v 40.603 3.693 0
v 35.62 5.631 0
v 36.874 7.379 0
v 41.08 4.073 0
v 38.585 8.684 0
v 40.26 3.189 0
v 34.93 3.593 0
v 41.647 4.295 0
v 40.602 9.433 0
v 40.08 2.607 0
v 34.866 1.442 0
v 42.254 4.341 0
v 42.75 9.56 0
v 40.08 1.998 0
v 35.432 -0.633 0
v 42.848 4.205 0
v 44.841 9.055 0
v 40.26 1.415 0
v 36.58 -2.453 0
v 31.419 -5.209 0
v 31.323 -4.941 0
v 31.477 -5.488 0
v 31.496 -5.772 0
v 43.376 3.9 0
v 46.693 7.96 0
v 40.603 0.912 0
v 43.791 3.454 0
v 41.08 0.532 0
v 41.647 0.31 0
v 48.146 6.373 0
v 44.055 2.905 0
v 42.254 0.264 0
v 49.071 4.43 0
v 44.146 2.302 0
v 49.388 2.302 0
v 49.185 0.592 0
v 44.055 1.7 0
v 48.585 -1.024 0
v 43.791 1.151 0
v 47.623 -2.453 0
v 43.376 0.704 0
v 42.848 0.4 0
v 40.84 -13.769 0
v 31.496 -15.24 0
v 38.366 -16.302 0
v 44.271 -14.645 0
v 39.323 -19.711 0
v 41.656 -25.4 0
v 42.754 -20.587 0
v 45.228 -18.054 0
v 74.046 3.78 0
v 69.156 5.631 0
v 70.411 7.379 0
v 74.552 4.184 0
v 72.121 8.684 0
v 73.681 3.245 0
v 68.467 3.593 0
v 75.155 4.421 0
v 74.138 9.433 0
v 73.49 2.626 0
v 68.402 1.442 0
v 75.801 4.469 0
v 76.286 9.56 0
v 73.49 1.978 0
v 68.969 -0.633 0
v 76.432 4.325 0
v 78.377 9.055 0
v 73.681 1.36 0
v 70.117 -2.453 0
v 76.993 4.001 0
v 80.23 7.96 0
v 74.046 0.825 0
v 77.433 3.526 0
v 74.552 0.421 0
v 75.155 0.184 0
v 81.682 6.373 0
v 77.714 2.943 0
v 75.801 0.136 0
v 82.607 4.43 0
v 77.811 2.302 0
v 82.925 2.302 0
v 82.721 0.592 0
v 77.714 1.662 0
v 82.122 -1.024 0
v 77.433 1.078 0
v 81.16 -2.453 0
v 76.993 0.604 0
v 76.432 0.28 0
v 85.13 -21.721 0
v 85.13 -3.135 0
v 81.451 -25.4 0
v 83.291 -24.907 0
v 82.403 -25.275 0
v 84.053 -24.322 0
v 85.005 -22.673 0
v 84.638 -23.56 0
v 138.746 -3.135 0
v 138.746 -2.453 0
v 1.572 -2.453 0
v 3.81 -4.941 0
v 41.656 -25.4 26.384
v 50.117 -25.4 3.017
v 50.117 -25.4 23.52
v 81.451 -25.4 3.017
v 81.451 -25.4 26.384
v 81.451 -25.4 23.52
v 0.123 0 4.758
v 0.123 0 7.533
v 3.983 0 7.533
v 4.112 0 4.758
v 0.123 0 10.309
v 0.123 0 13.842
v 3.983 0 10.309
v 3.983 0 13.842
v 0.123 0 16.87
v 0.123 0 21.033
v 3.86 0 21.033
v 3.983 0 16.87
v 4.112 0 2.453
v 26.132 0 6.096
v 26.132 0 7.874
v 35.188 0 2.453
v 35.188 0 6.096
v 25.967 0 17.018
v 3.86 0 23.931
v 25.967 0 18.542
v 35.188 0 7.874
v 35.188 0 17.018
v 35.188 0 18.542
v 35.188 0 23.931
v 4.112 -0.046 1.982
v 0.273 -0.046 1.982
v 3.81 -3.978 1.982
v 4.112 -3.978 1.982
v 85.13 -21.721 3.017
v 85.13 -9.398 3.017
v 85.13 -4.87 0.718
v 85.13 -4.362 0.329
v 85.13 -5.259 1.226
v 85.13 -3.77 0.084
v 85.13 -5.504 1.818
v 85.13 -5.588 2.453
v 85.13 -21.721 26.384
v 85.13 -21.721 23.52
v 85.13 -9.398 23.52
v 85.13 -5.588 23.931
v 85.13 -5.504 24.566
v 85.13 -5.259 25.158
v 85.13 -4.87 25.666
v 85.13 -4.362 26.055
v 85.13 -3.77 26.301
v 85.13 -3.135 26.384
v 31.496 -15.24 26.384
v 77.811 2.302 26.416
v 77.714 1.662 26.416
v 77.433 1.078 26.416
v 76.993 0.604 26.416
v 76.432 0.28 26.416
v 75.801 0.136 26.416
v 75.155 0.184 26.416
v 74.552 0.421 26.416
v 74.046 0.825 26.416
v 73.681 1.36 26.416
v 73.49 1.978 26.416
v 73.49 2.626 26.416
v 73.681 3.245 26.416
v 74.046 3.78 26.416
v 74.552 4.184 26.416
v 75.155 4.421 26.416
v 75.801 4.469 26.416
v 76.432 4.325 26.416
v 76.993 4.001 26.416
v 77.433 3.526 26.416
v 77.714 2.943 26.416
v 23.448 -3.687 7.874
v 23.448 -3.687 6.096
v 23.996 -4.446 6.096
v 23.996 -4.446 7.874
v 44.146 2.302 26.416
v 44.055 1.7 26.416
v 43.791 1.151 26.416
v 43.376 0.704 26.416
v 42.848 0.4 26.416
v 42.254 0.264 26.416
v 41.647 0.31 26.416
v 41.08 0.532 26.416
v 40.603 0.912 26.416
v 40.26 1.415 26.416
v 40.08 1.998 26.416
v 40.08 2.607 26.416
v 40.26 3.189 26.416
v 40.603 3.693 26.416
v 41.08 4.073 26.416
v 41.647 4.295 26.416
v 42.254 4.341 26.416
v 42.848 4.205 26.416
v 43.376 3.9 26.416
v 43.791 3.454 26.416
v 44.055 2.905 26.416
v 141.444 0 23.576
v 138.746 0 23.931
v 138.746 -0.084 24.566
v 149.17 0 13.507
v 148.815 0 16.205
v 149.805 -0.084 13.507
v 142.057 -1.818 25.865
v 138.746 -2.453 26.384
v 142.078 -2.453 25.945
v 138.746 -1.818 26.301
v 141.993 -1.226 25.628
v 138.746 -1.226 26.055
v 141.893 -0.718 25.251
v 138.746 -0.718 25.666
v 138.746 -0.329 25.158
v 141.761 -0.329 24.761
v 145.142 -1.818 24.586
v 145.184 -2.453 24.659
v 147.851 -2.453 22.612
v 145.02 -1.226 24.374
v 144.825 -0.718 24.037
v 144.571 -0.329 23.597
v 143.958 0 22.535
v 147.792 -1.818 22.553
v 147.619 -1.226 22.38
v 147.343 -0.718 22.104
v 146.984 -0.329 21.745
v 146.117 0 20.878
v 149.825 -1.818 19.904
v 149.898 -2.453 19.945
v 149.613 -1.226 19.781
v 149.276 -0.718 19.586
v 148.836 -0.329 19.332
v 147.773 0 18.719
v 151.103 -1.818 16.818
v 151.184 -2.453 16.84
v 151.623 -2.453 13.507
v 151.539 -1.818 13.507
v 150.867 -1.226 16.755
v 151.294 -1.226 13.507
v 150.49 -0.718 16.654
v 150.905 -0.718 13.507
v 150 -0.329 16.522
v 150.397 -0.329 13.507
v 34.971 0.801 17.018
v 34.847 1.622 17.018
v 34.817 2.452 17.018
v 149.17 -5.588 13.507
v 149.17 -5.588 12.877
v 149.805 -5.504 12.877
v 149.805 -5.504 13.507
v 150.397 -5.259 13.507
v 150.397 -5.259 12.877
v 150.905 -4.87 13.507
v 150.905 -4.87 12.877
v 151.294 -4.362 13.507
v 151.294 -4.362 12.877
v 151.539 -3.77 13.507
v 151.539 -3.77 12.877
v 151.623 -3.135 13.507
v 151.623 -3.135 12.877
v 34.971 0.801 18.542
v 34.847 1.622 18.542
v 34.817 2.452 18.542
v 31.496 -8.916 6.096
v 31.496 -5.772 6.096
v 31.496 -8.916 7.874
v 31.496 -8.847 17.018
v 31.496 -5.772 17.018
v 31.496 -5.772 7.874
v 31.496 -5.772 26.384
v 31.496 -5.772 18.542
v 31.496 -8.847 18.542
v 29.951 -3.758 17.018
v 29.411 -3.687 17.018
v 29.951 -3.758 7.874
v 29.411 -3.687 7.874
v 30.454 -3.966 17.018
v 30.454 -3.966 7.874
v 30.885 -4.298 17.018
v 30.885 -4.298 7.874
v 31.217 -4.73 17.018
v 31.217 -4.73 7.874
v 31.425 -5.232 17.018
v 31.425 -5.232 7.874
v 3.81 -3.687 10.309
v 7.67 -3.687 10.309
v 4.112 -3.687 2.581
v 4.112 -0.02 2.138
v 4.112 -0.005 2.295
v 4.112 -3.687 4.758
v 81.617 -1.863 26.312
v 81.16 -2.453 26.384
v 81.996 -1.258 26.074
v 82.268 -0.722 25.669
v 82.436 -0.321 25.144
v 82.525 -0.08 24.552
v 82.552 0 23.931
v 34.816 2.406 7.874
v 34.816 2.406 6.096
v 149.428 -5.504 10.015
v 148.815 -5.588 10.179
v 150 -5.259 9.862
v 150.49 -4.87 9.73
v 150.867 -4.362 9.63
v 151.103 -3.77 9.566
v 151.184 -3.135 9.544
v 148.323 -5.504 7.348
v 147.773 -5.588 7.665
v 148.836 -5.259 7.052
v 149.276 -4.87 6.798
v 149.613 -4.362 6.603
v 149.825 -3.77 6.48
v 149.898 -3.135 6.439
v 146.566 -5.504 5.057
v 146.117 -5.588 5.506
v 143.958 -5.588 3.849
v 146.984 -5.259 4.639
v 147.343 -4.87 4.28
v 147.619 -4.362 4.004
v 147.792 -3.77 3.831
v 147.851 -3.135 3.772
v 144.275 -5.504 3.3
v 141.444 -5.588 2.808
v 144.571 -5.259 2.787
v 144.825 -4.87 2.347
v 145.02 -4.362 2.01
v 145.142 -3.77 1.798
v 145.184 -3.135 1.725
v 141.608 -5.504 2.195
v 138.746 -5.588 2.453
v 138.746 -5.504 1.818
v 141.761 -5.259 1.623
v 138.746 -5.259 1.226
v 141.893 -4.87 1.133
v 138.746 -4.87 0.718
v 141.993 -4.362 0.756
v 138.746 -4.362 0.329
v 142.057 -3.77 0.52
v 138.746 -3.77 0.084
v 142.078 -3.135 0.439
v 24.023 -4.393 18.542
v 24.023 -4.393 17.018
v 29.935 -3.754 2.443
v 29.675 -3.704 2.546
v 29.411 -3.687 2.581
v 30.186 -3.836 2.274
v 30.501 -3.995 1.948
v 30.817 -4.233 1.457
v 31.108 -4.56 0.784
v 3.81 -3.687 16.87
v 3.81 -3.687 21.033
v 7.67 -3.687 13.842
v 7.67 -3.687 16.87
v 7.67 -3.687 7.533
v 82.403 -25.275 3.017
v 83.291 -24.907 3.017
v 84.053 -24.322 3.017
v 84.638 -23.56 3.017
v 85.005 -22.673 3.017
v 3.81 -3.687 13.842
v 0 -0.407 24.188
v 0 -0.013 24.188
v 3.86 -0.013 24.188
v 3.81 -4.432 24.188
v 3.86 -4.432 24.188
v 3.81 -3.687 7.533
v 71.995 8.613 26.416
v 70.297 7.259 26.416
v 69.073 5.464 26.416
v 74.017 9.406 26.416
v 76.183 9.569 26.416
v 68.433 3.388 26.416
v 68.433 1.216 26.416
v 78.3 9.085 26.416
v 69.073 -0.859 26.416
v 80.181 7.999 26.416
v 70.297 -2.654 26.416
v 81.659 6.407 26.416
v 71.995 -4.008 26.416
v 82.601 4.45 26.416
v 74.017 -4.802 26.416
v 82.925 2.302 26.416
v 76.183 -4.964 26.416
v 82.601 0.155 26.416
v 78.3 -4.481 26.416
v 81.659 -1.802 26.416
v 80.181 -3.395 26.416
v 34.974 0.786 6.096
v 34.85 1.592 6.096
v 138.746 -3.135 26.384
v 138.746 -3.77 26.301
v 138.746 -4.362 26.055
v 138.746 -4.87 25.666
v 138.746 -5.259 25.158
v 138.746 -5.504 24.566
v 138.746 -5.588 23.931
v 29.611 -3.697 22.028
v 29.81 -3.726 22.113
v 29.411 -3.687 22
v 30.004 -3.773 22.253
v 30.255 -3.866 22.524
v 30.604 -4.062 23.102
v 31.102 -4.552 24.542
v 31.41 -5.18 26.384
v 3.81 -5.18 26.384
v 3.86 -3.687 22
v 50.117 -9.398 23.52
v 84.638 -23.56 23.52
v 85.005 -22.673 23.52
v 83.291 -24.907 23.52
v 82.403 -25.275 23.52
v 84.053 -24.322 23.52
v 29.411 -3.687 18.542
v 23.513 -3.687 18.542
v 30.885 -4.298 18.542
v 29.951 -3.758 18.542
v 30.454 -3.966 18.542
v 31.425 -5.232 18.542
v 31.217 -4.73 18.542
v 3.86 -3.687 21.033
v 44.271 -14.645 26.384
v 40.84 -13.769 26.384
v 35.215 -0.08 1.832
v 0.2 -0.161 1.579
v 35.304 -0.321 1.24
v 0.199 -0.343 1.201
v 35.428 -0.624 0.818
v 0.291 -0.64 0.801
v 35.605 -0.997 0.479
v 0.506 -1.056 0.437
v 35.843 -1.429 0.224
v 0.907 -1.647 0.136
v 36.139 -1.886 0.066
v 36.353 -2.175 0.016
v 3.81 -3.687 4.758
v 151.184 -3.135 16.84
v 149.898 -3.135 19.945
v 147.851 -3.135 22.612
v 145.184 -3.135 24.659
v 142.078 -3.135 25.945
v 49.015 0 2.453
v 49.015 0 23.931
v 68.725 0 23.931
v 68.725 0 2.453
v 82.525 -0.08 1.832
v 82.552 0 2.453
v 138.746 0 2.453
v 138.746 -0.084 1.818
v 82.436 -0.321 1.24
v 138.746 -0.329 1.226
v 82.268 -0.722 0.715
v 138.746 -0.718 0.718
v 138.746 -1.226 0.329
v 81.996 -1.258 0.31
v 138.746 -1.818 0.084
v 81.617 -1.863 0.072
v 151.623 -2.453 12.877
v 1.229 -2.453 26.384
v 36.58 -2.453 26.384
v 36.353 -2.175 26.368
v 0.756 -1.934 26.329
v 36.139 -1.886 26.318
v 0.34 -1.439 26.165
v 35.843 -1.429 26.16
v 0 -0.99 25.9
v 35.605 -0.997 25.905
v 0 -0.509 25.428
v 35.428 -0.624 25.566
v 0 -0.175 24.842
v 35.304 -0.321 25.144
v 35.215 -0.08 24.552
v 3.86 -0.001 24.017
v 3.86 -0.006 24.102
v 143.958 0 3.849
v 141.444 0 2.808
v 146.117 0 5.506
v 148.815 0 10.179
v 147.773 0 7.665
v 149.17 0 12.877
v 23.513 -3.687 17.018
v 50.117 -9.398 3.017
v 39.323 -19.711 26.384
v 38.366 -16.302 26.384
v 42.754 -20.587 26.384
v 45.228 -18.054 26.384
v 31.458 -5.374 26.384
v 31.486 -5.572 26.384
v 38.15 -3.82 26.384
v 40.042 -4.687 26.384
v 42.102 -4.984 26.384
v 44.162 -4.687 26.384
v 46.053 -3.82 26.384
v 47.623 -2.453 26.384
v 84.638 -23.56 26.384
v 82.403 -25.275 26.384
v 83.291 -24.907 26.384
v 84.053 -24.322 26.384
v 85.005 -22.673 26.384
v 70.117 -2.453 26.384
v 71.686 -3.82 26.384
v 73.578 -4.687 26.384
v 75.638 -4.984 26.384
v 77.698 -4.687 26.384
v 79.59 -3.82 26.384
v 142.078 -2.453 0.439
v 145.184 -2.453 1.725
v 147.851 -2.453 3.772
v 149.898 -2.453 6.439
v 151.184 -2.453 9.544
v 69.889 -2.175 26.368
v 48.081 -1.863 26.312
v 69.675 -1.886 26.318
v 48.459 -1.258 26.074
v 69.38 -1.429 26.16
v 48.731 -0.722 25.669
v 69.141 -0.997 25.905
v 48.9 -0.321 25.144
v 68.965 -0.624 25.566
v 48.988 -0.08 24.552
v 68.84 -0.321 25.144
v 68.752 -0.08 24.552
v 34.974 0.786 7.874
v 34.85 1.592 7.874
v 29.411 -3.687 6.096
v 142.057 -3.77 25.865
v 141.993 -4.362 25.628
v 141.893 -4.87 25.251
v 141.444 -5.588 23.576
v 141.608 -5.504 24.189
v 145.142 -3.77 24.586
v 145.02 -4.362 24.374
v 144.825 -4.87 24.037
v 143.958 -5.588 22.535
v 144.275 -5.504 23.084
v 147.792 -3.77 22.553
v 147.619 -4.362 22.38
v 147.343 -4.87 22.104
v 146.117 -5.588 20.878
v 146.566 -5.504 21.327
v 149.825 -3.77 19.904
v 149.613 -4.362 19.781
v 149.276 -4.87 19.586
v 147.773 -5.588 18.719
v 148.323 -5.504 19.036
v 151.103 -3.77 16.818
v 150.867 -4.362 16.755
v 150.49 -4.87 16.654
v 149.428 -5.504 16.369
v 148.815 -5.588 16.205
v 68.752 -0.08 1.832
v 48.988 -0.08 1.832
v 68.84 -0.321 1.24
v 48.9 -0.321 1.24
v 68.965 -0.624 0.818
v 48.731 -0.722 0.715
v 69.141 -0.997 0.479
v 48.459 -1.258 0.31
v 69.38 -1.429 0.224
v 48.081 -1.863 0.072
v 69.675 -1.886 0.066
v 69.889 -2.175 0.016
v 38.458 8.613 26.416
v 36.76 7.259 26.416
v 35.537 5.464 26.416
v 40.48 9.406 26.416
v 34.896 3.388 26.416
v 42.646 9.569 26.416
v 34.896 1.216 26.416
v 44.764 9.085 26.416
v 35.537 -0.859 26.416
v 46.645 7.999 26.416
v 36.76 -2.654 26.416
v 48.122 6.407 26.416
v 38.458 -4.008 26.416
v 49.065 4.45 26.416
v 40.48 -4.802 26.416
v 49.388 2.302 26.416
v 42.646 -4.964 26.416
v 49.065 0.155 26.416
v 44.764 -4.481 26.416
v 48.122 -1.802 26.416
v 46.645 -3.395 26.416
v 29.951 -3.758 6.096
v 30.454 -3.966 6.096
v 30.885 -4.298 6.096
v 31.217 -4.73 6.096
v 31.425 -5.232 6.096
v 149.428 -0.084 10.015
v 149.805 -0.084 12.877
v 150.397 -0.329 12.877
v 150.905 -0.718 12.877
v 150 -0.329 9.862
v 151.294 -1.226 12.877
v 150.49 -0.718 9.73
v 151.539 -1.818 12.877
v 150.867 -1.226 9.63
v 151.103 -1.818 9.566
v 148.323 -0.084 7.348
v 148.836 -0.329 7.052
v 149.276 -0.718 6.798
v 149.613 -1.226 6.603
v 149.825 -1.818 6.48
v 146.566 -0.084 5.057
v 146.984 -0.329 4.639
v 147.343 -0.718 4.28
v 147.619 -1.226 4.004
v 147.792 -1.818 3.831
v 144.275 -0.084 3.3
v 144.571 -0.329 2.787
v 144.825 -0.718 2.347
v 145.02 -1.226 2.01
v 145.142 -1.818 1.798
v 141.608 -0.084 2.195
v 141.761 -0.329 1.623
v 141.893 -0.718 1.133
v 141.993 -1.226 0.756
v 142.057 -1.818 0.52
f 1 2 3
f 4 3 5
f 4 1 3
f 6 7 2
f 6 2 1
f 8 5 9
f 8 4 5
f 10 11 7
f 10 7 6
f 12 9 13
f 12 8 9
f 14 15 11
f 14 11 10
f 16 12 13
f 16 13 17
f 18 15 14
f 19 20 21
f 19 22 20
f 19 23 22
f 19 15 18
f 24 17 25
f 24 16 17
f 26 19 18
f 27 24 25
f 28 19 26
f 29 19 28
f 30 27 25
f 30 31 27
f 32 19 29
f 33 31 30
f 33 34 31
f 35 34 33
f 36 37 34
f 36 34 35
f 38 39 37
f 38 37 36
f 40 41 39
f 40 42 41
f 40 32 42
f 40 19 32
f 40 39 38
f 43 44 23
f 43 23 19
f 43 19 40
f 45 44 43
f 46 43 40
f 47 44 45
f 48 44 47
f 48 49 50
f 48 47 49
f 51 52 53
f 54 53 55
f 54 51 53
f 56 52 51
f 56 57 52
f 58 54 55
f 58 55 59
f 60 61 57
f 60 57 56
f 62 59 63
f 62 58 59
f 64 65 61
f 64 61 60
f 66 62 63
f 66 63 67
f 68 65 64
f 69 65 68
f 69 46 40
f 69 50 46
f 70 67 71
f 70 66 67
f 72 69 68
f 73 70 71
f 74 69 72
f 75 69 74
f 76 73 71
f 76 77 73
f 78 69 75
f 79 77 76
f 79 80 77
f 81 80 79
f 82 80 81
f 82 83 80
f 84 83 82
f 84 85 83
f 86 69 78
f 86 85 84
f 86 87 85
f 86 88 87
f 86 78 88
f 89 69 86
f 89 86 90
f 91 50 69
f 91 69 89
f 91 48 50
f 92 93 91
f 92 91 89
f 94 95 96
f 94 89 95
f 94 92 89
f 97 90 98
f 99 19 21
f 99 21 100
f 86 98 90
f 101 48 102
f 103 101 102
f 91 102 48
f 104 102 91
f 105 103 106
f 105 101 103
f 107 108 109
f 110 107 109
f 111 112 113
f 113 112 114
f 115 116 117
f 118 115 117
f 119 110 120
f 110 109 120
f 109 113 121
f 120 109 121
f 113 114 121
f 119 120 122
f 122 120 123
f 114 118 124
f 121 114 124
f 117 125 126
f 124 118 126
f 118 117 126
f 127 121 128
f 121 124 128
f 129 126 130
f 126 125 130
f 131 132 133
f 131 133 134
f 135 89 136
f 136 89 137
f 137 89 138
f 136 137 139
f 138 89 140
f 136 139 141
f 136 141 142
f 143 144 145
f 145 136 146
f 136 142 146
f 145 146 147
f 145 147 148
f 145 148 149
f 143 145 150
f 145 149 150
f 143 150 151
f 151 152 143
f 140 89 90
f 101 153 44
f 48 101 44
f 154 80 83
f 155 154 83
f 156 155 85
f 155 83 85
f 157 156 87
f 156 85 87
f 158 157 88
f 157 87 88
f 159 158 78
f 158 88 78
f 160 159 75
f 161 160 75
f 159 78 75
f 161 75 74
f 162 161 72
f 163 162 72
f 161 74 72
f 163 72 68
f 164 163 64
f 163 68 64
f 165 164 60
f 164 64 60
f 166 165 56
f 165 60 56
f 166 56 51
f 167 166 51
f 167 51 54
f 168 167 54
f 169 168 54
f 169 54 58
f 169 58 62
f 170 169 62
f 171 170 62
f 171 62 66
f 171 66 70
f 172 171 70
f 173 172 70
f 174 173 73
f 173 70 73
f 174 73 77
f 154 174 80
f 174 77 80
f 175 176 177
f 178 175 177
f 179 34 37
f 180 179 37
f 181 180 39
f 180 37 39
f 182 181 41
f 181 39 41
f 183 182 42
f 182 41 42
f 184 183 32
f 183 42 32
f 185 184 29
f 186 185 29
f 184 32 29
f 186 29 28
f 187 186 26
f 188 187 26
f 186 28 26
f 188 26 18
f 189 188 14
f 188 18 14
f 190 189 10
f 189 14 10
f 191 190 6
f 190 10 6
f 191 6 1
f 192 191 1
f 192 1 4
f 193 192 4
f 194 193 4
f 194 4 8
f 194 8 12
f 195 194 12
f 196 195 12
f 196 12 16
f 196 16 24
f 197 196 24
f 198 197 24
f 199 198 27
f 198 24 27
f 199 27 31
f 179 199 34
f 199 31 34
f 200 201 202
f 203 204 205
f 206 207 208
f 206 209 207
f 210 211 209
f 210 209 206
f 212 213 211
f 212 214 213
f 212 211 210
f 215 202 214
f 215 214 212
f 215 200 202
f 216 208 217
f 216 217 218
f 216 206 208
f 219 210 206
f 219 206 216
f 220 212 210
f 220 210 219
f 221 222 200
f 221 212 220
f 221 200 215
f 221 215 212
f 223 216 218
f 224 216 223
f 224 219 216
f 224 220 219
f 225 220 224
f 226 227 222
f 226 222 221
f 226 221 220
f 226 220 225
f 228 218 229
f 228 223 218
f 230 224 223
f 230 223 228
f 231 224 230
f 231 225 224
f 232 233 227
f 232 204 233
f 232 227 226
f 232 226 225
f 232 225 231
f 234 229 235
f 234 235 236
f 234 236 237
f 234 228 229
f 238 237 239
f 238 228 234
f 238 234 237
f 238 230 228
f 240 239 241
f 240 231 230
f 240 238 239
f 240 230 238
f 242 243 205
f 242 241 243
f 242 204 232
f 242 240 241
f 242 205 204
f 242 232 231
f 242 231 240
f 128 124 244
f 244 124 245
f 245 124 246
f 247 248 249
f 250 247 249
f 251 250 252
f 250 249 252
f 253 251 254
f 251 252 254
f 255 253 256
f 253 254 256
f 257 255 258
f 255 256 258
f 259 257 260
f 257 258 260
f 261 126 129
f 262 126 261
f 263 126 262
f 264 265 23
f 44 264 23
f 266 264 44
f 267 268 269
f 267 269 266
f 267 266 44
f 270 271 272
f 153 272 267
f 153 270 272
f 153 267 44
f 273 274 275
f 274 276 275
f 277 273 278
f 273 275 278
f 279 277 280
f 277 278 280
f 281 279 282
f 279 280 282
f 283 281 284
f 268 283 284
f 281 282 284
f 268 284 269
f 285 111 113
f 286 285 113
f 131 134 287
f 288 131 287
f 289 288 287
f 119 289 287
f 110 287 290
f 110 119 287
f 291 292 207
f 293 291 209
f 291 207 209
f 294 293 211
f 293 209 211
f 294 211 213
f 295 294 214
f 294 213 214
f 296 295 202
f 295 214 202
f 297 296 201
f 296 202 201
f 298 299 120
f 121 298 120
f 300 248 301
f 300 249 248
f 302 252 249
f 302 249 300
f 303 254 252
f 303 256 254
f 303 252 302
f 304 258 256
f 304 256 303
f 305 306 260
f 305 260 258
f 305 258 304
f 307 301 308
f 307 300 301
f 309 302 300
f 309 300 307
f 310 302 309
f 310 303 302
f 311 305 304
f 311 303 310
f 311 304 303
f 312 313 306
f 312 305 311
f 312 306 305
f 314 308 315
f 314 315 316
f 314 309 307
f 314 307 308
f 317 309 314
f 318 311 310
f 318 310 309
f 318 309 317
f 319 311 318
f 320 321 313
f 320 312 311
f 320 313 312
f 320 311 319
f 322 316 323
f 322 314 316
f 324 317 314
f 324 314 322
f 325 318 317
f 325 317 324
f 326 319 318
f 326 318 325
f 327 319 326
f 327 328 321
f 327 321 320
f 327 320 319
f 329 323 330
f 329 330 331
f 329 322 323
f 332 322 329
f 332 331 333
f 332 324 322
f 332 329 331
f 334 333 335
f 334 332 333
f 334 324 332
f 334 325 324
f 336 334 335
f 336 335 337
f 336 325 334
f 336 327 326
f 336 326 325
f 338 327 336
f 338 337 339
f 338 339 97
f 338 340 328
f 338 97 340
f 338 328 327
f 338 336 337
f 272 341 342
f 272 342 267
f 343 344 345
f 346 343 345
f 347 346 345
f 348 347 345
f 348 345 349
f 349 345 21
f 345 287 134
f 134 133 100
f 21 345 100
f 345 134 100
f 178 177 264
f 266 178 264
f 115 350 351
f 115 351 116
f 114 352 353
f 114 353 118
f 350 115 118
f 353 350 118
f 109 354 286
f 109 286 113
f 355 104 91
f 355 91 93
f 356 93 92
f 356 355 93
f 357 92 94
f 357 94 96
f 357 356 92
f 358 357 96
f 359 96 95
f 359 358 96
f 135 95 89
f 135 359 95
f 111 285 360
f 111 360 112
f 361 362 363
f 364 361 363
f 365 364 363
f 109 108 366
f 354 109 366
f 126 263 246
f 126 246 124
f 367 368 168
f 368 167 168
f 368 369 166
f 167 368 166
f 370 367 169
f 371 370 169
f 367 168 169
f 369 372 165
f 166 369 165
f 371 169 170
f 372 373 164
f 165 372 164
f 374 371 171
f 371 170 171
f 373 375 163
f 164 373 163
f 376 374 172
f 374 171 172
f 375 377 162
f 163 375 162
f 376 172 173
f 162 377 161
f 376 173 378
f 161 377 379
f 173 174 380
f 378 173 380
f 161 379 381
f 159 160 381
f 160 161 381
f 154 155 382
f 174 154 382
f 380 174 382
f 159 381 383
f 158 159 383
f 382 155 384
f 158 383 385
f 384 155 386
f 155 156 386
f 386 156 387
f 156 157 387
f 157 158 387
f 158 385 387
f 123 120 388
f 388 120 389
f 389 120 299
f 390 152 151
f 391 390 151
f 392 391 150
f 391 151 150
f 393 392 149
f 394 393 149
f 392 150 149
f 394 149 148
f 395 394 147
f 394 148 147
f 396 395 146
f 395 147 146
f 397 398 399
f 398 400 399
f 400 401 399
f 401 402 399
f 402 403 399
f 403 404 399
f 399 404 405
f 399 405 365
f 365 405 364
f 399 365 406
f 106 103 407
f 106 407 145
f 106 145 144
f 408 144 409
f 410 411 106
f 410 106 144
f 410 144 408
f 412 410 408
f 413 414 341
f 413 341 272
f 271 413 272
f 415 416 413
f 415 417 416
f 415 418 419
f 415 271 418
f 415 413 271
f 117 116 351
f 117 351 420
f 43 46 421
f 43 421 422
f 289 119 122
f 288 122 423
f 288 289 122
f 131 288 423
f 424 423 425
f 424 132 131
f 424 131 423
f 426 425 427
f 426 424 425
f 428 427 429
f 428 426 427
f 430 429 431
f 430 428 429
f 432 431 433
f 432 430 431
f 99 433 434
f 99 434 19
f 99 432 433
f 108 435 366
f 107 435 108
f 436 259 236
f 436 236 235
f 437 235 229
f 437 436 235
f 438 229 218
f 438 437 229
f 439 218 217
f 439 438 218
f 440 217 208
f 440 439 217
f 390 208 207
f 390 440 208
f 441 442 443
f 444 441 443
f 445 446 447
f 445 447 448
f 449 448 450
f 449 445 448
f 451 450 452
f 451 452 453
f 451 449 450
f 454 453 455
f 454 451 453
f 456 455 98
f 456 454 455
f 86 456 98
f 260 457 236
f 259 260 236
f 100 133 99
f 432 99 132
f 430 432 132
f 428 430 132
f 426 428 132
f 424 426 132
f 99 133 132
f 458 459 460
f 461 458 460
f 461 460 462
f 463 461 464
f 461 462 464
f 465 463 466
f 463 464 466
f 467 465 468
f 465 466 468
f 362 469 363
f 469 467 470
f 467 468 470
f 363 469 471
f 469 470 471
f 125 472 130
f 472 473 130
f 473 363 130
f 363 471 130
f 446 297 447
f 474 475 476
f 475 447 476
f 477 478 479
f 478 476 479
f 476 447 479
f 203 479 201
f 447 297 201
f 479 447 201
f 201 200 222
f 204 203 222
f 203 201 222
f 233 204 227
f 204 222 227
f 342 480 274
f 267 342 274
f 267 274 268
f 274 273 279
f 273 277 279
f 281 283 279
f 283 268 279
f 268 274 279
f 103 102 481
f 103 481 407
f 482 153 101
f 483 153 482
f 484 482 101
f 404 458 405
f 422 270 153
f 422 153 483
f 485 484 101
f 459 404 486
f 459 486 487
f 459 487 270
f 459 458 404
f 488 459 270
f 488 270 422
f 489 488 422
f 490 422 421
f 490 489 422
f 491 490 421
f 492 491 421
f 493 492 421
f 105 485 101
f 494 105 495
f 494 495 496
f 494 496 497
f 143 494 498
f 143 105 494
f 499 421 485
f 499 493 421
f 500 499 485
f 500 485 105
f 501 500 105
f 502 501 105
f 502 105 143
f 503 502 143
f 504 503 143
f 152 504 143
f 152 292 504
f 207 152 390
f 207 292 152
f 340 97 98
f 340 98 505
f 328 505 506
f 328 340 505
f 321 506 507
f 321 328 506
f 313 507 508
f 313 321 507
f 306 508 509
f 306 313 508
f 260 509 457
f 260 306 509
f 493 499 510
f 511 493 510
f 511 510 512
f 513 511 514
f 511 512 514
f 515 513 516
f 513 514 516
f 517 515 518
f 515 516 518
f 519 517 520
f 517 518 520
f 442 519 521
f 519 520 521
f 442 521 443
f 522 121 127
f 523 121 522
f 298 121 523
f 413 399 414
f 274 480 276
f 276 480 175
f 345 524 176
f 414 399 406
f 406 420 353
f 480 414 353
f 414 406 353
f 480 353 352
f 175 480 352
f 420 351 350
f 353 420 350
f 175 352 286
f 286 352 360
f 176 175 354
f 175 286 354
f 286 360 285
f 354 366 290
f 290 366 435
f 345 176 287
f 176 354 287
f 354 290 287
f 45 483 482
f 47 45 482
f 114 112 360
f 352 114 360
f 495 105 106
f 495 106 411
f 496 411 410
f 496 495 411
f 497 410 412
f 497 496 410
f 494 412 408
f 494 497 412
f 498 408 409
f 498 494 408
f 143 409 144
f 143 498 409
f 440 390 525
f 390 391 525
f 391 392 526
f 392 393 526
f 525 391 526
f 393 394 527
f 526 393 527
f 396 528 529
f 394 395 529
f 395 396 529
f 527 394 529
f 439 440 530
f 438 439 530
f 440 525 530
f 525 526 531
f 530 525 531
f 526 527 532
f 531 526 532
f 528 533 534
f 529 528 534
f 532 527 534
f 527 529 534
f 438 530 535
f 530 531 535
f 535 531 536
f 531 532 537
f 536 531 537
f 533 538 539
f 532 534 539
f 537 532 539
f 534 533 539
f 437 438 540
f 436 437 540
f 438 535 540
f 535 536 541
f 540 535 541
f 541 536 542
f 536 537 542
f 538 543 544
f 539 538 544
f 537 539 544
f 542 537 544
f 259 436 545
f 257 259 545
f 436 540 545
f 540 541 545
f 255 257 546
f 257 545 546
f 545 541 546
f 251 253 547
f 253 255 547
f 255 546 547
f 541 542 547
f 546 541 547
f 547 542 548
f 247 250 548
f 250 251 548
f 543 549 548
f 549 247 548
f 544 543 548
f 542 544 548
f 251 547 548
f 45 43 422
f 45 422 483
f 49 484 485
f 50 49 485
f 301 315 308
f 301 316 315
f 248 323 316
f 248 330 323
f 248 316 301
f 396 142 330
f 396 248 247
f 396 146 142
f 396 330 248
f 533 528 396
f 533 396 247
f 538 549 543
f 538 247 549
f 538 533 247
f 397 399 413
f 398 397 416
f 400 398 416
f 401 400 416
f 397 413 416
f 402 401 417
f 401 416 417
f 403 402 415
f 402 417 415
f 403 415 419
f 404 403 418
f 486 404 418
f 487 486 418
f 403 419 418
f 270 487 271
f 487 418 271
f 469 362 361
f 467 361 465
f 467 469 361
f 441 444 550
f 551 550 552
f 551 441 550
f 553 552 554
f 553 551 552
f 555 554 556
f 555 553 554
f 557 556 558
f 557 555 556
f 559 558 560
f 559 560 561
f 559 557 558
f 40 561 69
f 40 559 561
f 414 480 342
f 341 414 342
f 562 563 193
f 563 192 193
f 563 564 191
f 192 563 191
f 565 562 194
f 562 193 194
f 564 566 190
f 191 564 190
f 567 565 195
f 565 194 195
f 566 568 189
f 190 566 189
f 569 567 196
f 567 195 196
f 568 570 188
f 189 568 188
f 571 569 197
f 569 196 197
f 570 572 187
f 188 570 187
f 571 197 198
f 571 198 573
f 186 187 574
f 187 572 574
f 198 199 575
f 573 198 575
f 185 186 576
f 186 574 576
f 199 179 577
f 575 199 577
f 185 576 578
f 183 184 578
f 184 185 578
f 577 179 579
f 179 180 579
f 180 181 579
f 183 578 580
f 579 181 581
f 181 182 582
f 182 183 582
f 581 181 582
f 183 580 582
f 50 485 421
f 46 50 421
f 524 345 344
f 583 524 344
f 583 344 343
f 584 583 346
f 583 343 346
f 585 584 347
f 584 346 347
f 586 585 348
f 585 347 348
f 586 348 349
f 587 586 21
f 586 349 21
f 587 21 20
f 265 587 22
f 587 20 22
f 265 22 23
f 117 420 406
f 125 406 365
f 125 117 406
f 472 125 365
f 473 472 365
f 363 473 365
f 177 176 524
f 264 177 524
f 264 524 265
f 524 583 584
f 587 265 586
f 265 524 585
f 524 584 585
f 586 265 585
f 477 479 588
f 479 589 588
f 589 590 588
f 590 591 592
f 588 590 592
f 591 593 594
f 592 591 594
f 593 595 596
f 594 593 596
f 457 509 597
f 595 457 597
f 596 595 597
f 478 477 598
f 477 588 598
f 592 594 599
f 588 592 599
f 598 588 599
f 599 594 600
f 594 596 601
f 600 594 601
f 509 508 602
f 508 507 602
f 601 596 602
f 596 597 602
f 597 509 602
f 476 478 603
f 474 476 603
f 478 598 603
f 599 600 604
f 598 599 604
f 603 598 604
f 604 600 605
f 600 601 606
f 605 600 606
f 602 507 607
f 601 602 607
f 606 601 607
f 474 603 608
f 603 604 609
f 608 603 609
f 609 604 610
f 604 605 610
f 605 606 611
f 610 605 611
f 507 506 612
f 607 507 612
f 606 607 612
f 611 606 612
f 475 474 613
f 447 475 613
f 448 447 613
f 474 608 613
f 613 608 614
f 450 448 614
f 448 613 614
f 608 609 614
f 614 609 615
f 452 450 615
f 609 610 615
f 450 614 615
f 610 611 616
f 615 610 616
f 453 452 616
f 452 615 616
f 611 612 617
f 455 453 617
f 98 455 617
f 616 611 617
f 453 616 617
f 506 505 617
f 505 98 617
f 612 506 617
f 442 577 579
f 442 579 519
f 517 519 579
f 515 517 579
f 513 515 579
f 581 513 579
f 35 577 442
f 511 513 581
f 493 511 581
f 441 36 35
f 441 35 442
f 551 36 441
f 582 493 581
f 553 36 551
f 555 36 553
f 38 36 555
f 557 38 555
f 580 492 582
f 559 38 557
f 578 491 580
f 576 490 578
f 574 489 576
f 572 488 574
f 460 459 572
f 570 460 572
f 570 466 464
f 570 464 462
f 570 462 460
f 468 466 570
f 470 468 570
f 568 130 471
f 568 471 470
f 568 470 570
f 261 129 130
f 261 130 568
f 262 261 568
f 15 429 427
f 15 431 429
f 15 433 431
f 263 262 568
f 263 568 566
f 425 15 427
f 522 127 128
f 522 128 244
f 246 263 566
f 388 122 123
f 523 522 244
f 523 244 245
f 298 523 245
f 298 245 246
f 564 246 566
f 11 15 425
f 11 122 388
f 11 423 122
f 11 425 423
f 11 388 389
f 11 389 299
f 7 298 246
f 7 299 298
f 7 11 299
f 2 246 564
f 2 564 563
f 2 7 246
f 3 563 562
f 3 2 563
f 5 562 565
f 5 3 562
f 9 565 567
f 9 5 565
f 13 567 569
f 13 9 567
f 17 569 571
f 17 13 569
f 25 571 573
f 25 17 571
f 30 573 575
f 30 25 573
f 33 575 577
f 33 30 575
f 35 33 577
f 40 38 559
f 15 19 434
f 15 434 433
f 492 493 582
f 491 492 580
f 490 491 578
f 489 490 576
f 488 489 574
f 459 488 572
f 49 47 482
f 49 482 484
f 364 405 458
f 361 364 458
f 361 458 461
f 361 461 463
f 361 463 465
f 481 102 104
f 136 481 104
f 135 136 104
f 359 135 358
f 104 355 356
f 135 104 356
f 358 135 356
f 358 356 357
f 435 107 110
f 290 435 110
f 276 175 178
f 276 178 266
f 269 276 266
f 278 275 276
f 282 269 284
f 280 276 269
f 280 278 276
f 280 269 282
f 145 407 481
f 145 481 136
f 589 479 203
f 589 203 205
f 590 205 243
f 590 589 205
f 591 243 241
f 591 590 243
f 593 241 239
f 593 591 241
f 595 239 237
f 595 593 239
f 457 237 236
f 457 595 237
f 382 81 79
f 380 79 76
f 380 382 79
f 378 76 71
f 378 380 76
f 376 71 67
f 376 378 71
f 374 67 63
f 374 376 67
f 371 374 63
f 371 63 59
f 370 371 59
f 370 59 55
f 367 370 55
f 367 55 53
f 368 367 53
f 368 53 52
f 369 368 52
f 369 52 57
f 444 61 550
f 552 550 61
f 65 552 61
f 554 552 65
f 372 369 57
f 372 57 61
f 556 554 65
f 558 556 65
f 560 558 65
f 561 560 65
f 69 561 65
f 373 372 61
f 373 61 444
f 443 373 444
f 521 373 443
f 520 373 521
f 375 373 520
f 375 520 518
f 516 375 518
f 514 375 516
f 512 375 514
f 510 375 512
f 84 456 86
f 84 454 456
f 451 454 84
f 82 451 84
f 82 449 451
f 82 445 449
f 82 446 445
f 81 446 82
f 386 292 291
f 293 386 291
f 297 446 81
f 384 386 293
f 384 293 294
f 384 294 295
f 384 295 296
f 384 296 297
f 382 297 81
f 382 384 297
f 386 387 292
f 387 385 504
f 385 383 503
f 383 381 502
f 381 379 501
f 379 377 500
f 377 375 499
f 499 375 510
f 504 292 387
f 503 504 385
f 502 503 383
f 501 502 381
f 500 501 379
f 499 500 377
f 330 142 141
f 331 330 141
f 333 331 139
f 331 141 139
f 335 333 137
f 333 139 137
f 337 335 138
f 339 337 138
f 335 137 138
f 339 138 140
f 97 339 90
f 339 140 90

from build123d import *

# Parameters (mm, degrees)
F0_W          = 85.1304866374
F0_H          = 26.3841096312
F1_DEPTH      = 25.4
F0_W_2        = 66.4924792945
F2_DEPTH      = 5.588
F4_DEPTH      = 31.496
F5_W          = 3.8600212429
F5_H          = 3.1541939825
F5_H_2        = 3.028026782
F5_H_3        = 2.775690984
F5_W_2        = 4.1123558767
F6_DEPTH      = 25.4
F8_DEPTH      = 28.702
F9_SIZE       = 10.16
F10_R         = 3.6792614691
F11_T1_DEPTH  = 4.1635371745
F11_T3_DEPTH  = 3.532698378
F11_T5_DEPTH  = 2.7756914496
F11_T7_DEPTH  = 3.028026782
F11_T9_DEPTH  = 2.775690984
F11_T14_DEPTH = 21.9165514071
F11_T20_DEPTH = 21.7996979777
F12_R         = 12.8774151417
F13_W         = 36.6102233529
F13_H         = 20.5034988467
F14_DEPTH     = 16.002
F15_R         = 7.2867112822
F15_R_2       = 2.0440412519
F15_R_3       = 2.1726876713
F16_DEPTH     = 26.416
F17_T1_DEPTH  = 53.6150641528
F17_T3_DEPTH  = 0.6292793478
F17_T8_DEPTH  = 62.3259871722
F17_S9_R      = 7.2867112822
F17_T10_DEPTH = 33
F17_T14_DEPTH = 31.9739065533
F17_S15_R     = 7.2867112822
F17_T16_DEPTH = 18
F17_S17_R     = 7.2867112822
F17_T18_DEPTH = 18
F17_T22_DEPTH = 47.4524435023
F17_S23_R     = 7.2867112822
F17_T24_DEPTH = 25
F17_T28_DEPTH = 31.9739065533
F17_S29_R     = 7.2867112822
F17_T30_DEPTH = 18
F17_S31_R     = 7.2867112822
F17_T32_DEPTH = 18
F17_T36_DEPTH = 47.4524435023
F17_S37_R     = 7.2867112822
F17_T38_DEPTH = 25
F17_T42_DEPTH = 62.3259871722
F17_S43_R     = 7.2867112822
F17_T44_DEPTH = 33
F17_T46_ANGLE = 90
F17_T48_ANGLE = 90
F17_T50_ANGLE = 90
F17_T52_ANGLE = 90
F21_DEPTH     = 1.778
F23_DEPTH     = 1.524
F24_R         = 2.0849148325


# Not quite as in the source:
# - a fillet or chamfer that OpenCascade refuses, or shapes differently, is made with other operations: its cross-section is extruded or revolved along the edge and cut away or added


with BuildPart() as f1:
    # F0 (on Front) → F1 (new body)
    with BuildSketch(Plane.XZ):
        with Locations((42.5652433187, 13.1920548156)):
            Rectangle(F0_W, F0_H)
    extrude(amount=F1_DEPTH)

    # F0 (on Front) → F2 (join)
    with BuildSketch(Plane.XZ):
        with Locations((118.3767262846, 13.1920548156)):
            Rectangle(F0_W_2, F0_H)
    extrude(amount=F2_DEPTH)

    # F3 (on face) → F4 (cut)
    with BuildSketch(Plane(origin=(0, 0, 0), x_dir=(0, -1, 0), z_dir=(-1, 0, 0))):
        Polygon((35.6419347227, 33.0609679222), (7.6199998148, 33.5525795817), (5.1796691639, 26.3841096312), (25.4, 26.3841096312), (25.4, 0), (4.9407089369, 0), (7.8658051789, -6.022258196), (35.6419347227, -6.022258196), align=None)
        Polygon((25.4, 26.3841096312), (5.1796691639, 26.3841096312), (3.687096294, 21.9996776432), (3.687096294, 2.5809677318), (4.9407089369, 0), (25.4, 0), align=None)
    extrude(amount=-F4_DEPTH, mode=Mode.SUBTRACT)

    # F5 (on Front) → F6 (cut)
    with BuildSketch(Plane.XZ):
        with Locations((1.9300106214, 22.6104753092)):
            Rectangle(F5_W, F5_H)
        with Locations((1.9300106214, 15.3558277525)):
            Rectangle(F5_W, F5_H_2)
        with Locations((1.9300106214, 8.9212704916)):
            Rectangle(F5_W, F5_H_3)
        with Locations((2.0561779384, 3.3698880579)):
            Rectangle(F5_W_2, F5_H_3)
    extrude(amount=F6_DEPTH, mode=Mode.SUBTRACT)

    # F7 (on Top) → F8 (cut)
    with BuildSketch(Plane.XY):
        Polygon((40.8404252998, -13.7686529255), (38.3662302699, -16.301950867), (39.3230331276, -19.7113155876), (42.7540310152, -20.5873823667), (45.2282260452, -18.0540844252), (44.2714231875, -14.6447197046), align=None)
    extrude(amount=F8_DEPTH, mode=Mode.SUBTRACT)

    # F9
    f9_edges = [f1.edges().sort_by_distance(p)[0] for p in [
        (31.496, -25.4, 13.192055),
    ]]
    chamfer(f9_edges, length=F9_SIZE)

    # F10
    f10_edges = [f1.edges().sort_by_distance(p)[0] for p in [
        (85.130487, -25.4, 13.192055),
    ]]
    fillet(f10_edges, radius=F10_R)

    # F11: chamfer of 3.81 on 7 edges, made by hand

    # F11_s2 → F11_t1 (cut)
    with BuildSketch(Plane.XY.offset(16.8698411435)):
        with BuildLine():
            Line((3.9177630735, -3.7948593675), (-0.1077630735, 0.2306667794))
            Line((-0.1077630735, 0.2306667794), (-0.1839630735, 0.2306667794))
            ThreePointArc((-0.1839630735, 0.2306667794), (-0.0762, -1.7282147573), (-0.0762, -3.687096294))
            Line((-0.0762, -3.687096294), (0, -3.763296294))
            ThreePointArc((0, -3.763296294), (1.9588815367, -3.763296294), (3.9177630735, -3.8710593675))
            Line((3.9177630735, -3.8710593675), (3.9177630735, -3.7948593675))
        make_face()
    extrude(amount=F11_T1_DEPTH, mode=Mode.SUBTRACT)

    # F11_s4 → F11_t3 (cut)
    with BuildSketch(Plane.XY.offset(10.3091159835)):
        with BuildLine():
            Line((3.9177630735, -3.7948593675), (-0.1077630735, 0.2306667794))
            Line((-0.1077630735, 0.2306667794), (-0.1839630735, 0.2306667794))
            ThreePointArc((-0.1839630735, 0.2306667794), (-0.0762, -1.7282147573), (-0.0762, -3.687096294))
            Line((-0.0762, -3.687096294), (0, -3.763296294))
            ThreePointArc((0, -3.763296294), (1.9588815367, -3.763296294), (3.9177630735, -3.8710593675))
            Line((3.9177630735, -3.8710593675), (3.9177630735, -3.7948593675))
        make_face()
    extrude(amount=F11_T3_DEPTH, mode=Mode.SUBTRACT)

    # F11_s6 → F11_t5 (cut)
    with BuildSketch(Plane.XY.offset(4.7577335499)):
        with BuildLine():
            Line((3.9177630735, -3.7948593675), (-0.1077630735, 0.2306667794))
            Line((-0.1077630735, 0.2306667794), (-0.1839630735, 0.2306667794))
            ThreePointArc((-0.1839630735, 0.2306667794), (-0.0762, -1.7282147573), (-0.0762, -3.687096294))
            Line((-0.0762, -3.687096294), (0, -3.763296294))
            ThreePointArc((0, -3.763296294), (1.9588815367, -3.763296294), (3.9177630735, -3.8710593675))
            Line((3.9177630735, -3.8710593675), (3.9177630735, -3.7948593675))
        make_face()
    extrude(amount=F11_T5_DEPTH, mode=Mode.SUBTRACT)

    # F11_s8 → F11_t7 (cut)
    with BuildSketch(Plane.XY.offset(13.8418143615)):
        with BuildLine():
            Line((7.7777843163, -3.7948593675), (3.7522581694, 0.2306667794))
            Line((3.7522581694, 0.2306667794), (3.6760581694, 0.2306667794))
            ThreePointArc((3.6760581694, 0.2306667794), (3.7838212429, -1.7282147573), (3.7838212429, -3.687096294))
            Line((3.7838212429, -3.687096294), (3.8600212429, -3.763296294))
            ThreePointArc((3.8600212429, -3.763296294), (5.8189027796, -3.763296294), (7.7777843163, -3.8710593675))
            Line((7.7777843163, -3.8710593675), (7.7777843163, -3.7948593675))
        make_face()
    extrude(amount=F11_T7_DEPTH, mode=Mode.SUBTRACT)

    # F11_s10 → F11_t9 (cut)
    with BuildSketch(Plane.XY.offset(7.5334249996)):
        with BuildLine():
            Line((7.7777843163, -3.7948593675), (3.7522581694, 0.2306667794))
            Line((3.7522581694, 0.2306667794), (3.6760581694, 0.2306667794))
            ThreePointArc((3.6760581694, 0.2306667794), (3.7838212429, -1.7282147573), (3.7838212429, -3.687096294))
            Line((3.7838212429, -3.687096294), (3.8600212429, -3.763296294))
            ThreePointArc((3.8600212429, -3.763296294), (5.8189027796, -3.763296294), (7.7777843163, -3.8710593675))
            Line((7.7777843163, -3.8710593675), (7.7777843163, -3.7948593675))
        make_face()
    extrude(amount=F11_T9_DEPTH, mode=Mode.SUBTRACT)


with BuildPart() as f11_tool12:
    # F11_s13 → F11_t14 (new body)
    with BuildSketch(Plane(origin=(0, -11.7445344188, 34.4995634238), x_dir=(1, 0, 0), z_dir=(0, 0.3222638516, -0.9466498877))):
        with BuildLine():
            Line((3.9177630735, -3.491548486), (-0.1077630735, -7.5170746329))
            Line((-0.1077630735, -7.5170746329), (-0.1839630735, -7.5170746329))
            ThreePointArc((-0.1839630735, -7.5170746329), (-0.0762, -5.5581930961), (-0.0762, -3.5993115594))
            Line((-0.0762, -3.5993115594), (0, -3.5231115594))
            ThreePointArc((0, -3.5231115594), (1.9588815367, -3.5231115594), (3.9177630735, -3.415348486))
            Line((3.9177630735, -3.415348486), (3.9177630735, -3.491548486))
        make_face()
    extrude(amount=F11_T14_DEPTH)

    split(bisect_by=Plane.XY.offset(26.3841096312), keep=Keep.BOTTOM)

    split(bisect_by=Plane.XY.offset(24.1875723004), keep=Keep.TOP)


with BuildPart() as f1_1:
    add(f1.part)

    # F11_t11: cut F11_tool12
    add(f11_tool12.part, mode=Mode.SUBTRACT)


with BuildPart() as f11_tool18:
    # F11_s19 → F11_t20 (new body)
    with BuildSketch(Plane(origin=(0, 4.3004322544, 8.8538329162), x_dir=(1, 0, 0), z_dir=(0, -0.4369038907, -0.8995081936))):
        with BuildLine():
            Line((3.9177630735, 4.5519712442), (-0.1077630735, 0.5264450973))
            Line((-0.1077630735, 0.5264450973), (-0.1839630735, 0.5264450973))
            ThreePointArc((-0.1839630735, 0.5264450973), (-0.0762, 2.485326634), (-0.0762, 4.4442081707))
            Line((-0.0762, 4.4442081707), (0, 4.5204081707))
            ThreePointArc((0, 4.5204081707), (1.9588815367, 4.5204081707), (3.9177630735, 4.6281712442))
            Line((3.9177630735, 4.6281712442), (3.9177630735, 4.5519712442))
        make_face()
    extrude(amount=F11_T20_DEPTH)

    split(bisect_by=Plane.XY.offset(1.9820425659), keep=Keep.BOTTOM)


with BuildPart() as f1_2:
    add(f1_1.part)

    # F11_t17: cut F11_tool18
    add(f11_tool18.part, mode=Mode.SUBTRACT)

    # F12
    f12_edges = [f1_2.edges().sort_by_distance(p)[0] for p in [
        (151.622966, -2.794, 0),
        (151.622966, -2.794, 26.38411),
    ]]
    fillet(f12_edges, radius=F12_R)

    # F13 (on face) → F14 (cut)
    with BuildSketch(Plane.XZ.offset(25.4)):
        with Locations((68.4222616255, 13.2684203563)):
            Rectangle(F13_W, F13_H)
    extrude(amount=-F14_DEPTH, mode=Mode.SUBTRACT)

    # F15 (on face) → F16 (join)
    with BuildSketch(Plane(origin=(0, 0, 0), x_dir=(1, 0, 0), z_dir=(0, 0, -1))):
        with Locations((42.1016700566, -2.3023090325)):
            Circle(F15_R)
        with Locations((42.1016700566, -2.3023090325)):
            Circle(F15_R_2, mode=Mode.SUBTRACT)
        with Locations((75.6382346153, -2.3023090325)):
            Circle(F15_R)
        with Locations((75.6382346153, -2.3023090325)):
            Circle(F15_R_3, mode=Mode.SUBTRACT)
    extrude(amount=-F16_DEPTH)

    # F17: fillet of radius 2.4528409794 on 14 edges, made by hand

    # F17_s2 → F17_t1 (cut)
    with BuildSketch(Plane.YZ.offset(85.1304866374)):
        with BuildLine():
            ThreePointArc((-5.588, 2.4528409794), (-4.8695795103, 0.7184204897), (-3.1351590206, 0))
            Line((-3.1351590206, 0), (-5.588, 0))
            Line((-5.588, 0), (-5.588, 2.4528409794))
        make_face()
        with BuildLine():
            ThreePointArc((-3.1351590206, 26.3841096312), (-4.8695795103, 25.6656891415), (-5.588, 23.9312686518))
            Line((-5.588, 23.9312686518), (-5.588, 26.3841096312))
            Line((-5.588, 26.3841096312), (-3.1351590206, 26.3841096312))
        make_face()
    extrude(amount=F17_T1_DEPTH, mode=Mode.SUBTRACT)

    # F17_s4 → F17_t3 (cut)
    with BuildSketch(Plane.XY.offset(12.8774151417)):
        with BuildLine():
            ThreePointArc((149.1701249525, 0), (150.9045454422, -0.7184204897), (151.6229659319, -2.4528409794))
            Line((151.6229659319, -2.4528409794), (151.6229659319, 0))
            Line((151.6229659319, 0), (149.1701249525, 0))
        make_face()
        with BuildLine():
            ThreePointArc((149.1701249525, -5.588), (150.9045454422, -4.8695795103), (151.6229659319, -3.1351590206))
            Line((151.6229659319, -3.1351590206), (151.6229659319, -5.588))
            Line((151.6229659319, -5.588), (149.1701249525, -5.588))
        make_face()
    extrude(amount=F17_T3_DEPTH, mode=Mode.SUBTRACT)


with BuildPart() as f17_tool6:
    # F17_s7 → F17_t8 (new body)
    with BuildSketch(Plane.YZ.offset(76.419563618)):
        with BuildLine():
            ThreePointArc((0, 2.4528409794), (-0.7184204897, 0.7184204897), (-2.4528409794, 0))
            Line((-2.4528409794, 0), (0, 0))
            Line((0, 0), (0, 2.4528409794))
        make_face()
    extrude(amount=F17_T8_DEPTH)

    # F17_s9 → F17_t10 (cut, symmetric)
    with BuildSketch(Plane.XY.offset(1.2)):
        with Locations((75.6382346153, 2.3023090325)):
            Circle(F17_S9_R)
    extrude(amount=F17_T10_DEPTH, both=True, mode=Mode.SUBTRACT)


with BuildPart() as f1_3:
    add(f1_2.part)

    # F17_t5: cut F17_tool6
    add(f17_tool6.part, mode=Mode.SUBTRACT)


with BuildPart() as f17_tool12:
    # F17_s13 → F17_t14 (new body)
    with BuildSketch(Plane.YZ.offset(42.8829990593)):
        with BuildLine():
            ThreePointArc((0, 2.4528409794), (-0.7184204897, 0.7184204897), (-2.4528409794, 0))
            Line((-2.4528409794, 0), (0, 0))
            Line((0, 0), (0, 2.4528409794))
        make_face()
    extrude(amount=F17_T14_DEPTH)

    # F17_s15 → F17_t16 (cut, symmetric)
    with BuildSketch(Plane.XY.offset(1.2)):
        with Locations((75.6382346153, 2.3023090325)):
            Circle(F17_S15_R)
    extrude(amount=F17_T16_DEPTH, both=True, mode=Mode.SUBTRACT)

    # F17_s17 → F17_t18 (cut, symmetric)
    with BuildSketch(Plane.XY.offset(1.2)):
        with Locations((42.1016700566, 2.3023090325)):
            Circle(F17_S17_R)
    extrude(amount=F17_T18_DEPTH, both=True, mode=Mode.SUBTRACT)


with BuildPart() as f1_4:
    add(f1_3.part)

    # F17_t11: cut F17_tool12
    add(f17_tool12.part, mode=Mode.SUBTRACT)


with BuildPart() as f17_tool20:
    # F17_s21 → F17_t22 (new body)
    with BuildSketch(Plane.YZ.offset(-6.1321024484)):
        with BuildLine():
            ThreePointArc((0, 2.4528409794), (-0.7184204897, 0.7184204897), (-2.4528409794, 0))
            Line((-2.4528409794, 0), (0, 0))
            Line((0, 0), (0, 2.4528409794))
        make_face()
    extrude(amount=F17_T22_DEPTH)

    # F17_s23 → F17_t24 (cut, symmetric)
    with BuildSketch(Plane.XY.offset(1.2)):
        with Locations((42.1016700566, 2.3023090325)):
            Circle(F17_S23_R)
    extrude(amount=F17_T24_DEPTH, both=True, mode=Mode.SUBTRACT)


with BuildPart() as f1_5:
    add(f1_4.part)

    # F17_t19: cut F17_tool20
    add(f17_tool20.part, mode=Mode.SUBTRACT)


with BuildPart() as f17_tool26:
    # F17_s27 → F17_t28 (new body)
    with BuildSketch(Plane.YZ.offset(74.8569056126)):
        with BuildLine():
            ThreePointArc((-2.4528409794, 26.3841096312), (-0.7184204897, 25.6656891415), (0, 23.9312686518))
            Line((0, 23.9312686518), (0, 26.3841096312))
            Line((0, 26.3841096312), (-2.4528409794, 26.3841096312))
        make_face()
    extrude(amount=-F17_T28_DEPTH)

    # F17_s29 → F17_t30 (cut, symmetric)
    with BuildSketch(Plane.XY.offset(25.2)):
        with Locations((75.6382346153, 2.3023090325)):
            Circle(F17_S29_R)
    extrude(amount=F17_T30_DEPTH, both=True, mode=Mode.SUBTRACT)

    # F17_s31 → F17_t32 (cut, symmetric)
    with BuildSketch(Plane.XY.offset(25.2)):
        with Locations((42.1016700566, 2.3023090325)):
            Circle(F17_S31_R)
    extrude(amount=F17_T32_DEPTH, both=True, mode=Mode.SUBTRACT)


with BuildPart() as f1_6:
    add(f1_5.part)

    # F17_t25: cut F17_tool26
    add(f17_tool26.part, mode=Mode.SUBTRACT)


with BuildPart() as f17_tool34:
    # F17_s35 → F17_t36 (new body)
    with BuildSketch(Plane.YZ.offset(41.3203410539)):
        with BuildLine():
            ThreePointArc((-2.4528409794, 26.3841096312), (-0.7184204897, 25.6656891415), (0, 23.9312686518))
            Line((0, 23.9312686518), (0, 26.3841096312))
            Line((0, 26.3841096312), (-2.4528409794, 26.3841096312))
        make_face()
    extrude(amount=-F17_T36_DEPTH)

    # F17_s37 → F17_t38 (cut, symmetric)
    with BuildSketch(Plane.XY.offset(25.2)):
        with Locations((42.1016700566, 2.3023090325)):
            Circle(F17_S37_R)
    extrude(amount=F17_T38_DEPTH, both=True, mode=Mode.SUBTRACT)


with BuildPart() as f1_7:
    add(f1_6.part)

    # F17_t33: cut F17_tool34
    add(f17_tool34.part, mode=Mode.SUBTRACT)


with BuildPart() as f17_tool40:
    # F17_s41 → F17_t42 (new body)
    with BuildSketch(Plane.YZ.offset(138.7455507902)):
        with BuildLine():
            ThreePointArc((-2.4528409794, 26.3841096312), (-0.7184204897, 25.6656891415), (0, 23.9312686518))
            Line((0, 23.9312686518), (0, 26.3841096312))
            Line((0, 26.3841096312), (-2.4528409794, 26.3841096312))
        make_face()
    extrude(amount=-F17_T42_DEPTH)

    # F17_s43 → F17_t44 (cut, symmetric)
    with BuildSketch(Plane.XY.offset(25.2)):
        with Locations((75.6382346153, 2.3023090325)):
            Circle(F17_S43_R)
    extrude(amount=F17_T44_DEPTH, both=True, mode=Mode.SUBTRACT)


with BuildPart() as f1_8:
    add(f1_7.part)

    # F17_t39: cut F17_tool40
    add(f17_tool40.part, mode=Mode.SUBTRACT)

    # F17_s45 → F17_t46 (revolve, cut)
    with BuildSketch(Plane.YZ.offset(138.7455507902)):
        with BuildLine():
            ThreePointArc((-2.4528409794, 26.3841096312), (-0.7184204897, 25.6656891415), (0, 23.9312686518))
            Line((0, 23.9312686518), (0, 26.3841096312))
            Line((0, 26.3841096312), (-2.4528409794, 26.3841096312))
        make_face()
    revolve(axis=Axis((138.7455507902, 0, 13.5066944895), (0, 1, 0)), revolution_arc=F17_T46_ANGLE, mode=Mode.SUBTRACT)

    # F17_s47 → F17_t48 (revolve, cut)
    with BuildSketch(Plane.YZ.offset(138.7455507902)):
        with BuildLine():
            ThreePointArc((-3.1351590206, 26.3841096312), (-4.8695795103, 25.6656891415), (-5.588, 23.9312686518))
            Line((-5.588, 23.9312686518), (-5.588, 26.3841096312))
            Line((-5.588, 26.3841096312), (-3.1351590206, 26.3841096312))
        make_face()
    revolve(axis=Axis((138.7455507902, -5.588, 13.5066944895), (0, 1, 0)), revolution_arc=F17_T48_ANGLE, mode=Mode.SUBTRACT)

    # F17_s49 → F17_t50 (revolve, cut)
    with BuildSketch(Plane.XY.offset(12.8774151417)):
        with BuildLine():
            ThreePointArc((149.1701249525, 0), (150.9045454422, -0.7184204897), (151.6229659319, -2.4528409794))
            Line((151.6229659319, -2.4528409794), (151.6229659319, 0))
            Line((151.6229659319, 0), (149.1701249525, 0))
        make_face()
    revolve(axis=Axis((138.7455507902, 0, 12.8774151417), (0, 1, 0)), revolution_arc=F17_T50_ANGLE, mode=Mode.SUBTRACT)

    # F17_s51 → F17_t52 (revolve, cut)
    with BuildSketch(Plane.XY.offset(12.8774151417)):
        with BuildLine():
            ThreePointArc((149.1701249525, -5.588), (150.9045454422, -4.8695795103), (151.6229659319, -3.1351590206))
            Line((151.6229659319, -3.1351590206), (151.6229659319, -5.588))
            Line((151.6229659319, -5.588), (149.1701249525, -5.588))
        make_face()
    revolve(axis=Axis((138.7455507902, -5.588, 12.8774151417), (0, 1, 0)), revolution_arc=F17_T52_ANGLE, mode=Mode.SUBTRACT)

    # F20 (on offset) → F21 (join)
    with BuildSketch(Plane.XY.offset(6.096)):
        Polygon((21.6764695942, -1.2347314041), (23.9960364997, -4.4464389794), (32.8282304108, -9.7100706771), (38.6150412891, 0), (36.4860072732, 2.8691168409), align=None)
    extrude(amount=F21_DEPTH)

    # F22 (on offset) → F23 (join)
    with BuildSketch(Plane.XY.offset(18.542)):
        Polygon((21.7032115906, -1.1815896723), (24.0227784961, -4.3932972476), (32.8549724072, -9.6569289453), (38.6417832855, 0.0531417318), (36.5127492696, 2.9222585727), align=None)
    extrude(amount=-F23_DEPTH)

    # F24
    f24_edges = [f1_8.edges().sort_by_distance(p)[0] for p in [
        (31.496, -3.687096, 12.446),
        (31.496, -3.687096, 4.338484),
        (31.496, -3.687096, 20.270839),
    ]]
    fillet(f24_edges, radius=F24_R)


solid = f1_8.part
